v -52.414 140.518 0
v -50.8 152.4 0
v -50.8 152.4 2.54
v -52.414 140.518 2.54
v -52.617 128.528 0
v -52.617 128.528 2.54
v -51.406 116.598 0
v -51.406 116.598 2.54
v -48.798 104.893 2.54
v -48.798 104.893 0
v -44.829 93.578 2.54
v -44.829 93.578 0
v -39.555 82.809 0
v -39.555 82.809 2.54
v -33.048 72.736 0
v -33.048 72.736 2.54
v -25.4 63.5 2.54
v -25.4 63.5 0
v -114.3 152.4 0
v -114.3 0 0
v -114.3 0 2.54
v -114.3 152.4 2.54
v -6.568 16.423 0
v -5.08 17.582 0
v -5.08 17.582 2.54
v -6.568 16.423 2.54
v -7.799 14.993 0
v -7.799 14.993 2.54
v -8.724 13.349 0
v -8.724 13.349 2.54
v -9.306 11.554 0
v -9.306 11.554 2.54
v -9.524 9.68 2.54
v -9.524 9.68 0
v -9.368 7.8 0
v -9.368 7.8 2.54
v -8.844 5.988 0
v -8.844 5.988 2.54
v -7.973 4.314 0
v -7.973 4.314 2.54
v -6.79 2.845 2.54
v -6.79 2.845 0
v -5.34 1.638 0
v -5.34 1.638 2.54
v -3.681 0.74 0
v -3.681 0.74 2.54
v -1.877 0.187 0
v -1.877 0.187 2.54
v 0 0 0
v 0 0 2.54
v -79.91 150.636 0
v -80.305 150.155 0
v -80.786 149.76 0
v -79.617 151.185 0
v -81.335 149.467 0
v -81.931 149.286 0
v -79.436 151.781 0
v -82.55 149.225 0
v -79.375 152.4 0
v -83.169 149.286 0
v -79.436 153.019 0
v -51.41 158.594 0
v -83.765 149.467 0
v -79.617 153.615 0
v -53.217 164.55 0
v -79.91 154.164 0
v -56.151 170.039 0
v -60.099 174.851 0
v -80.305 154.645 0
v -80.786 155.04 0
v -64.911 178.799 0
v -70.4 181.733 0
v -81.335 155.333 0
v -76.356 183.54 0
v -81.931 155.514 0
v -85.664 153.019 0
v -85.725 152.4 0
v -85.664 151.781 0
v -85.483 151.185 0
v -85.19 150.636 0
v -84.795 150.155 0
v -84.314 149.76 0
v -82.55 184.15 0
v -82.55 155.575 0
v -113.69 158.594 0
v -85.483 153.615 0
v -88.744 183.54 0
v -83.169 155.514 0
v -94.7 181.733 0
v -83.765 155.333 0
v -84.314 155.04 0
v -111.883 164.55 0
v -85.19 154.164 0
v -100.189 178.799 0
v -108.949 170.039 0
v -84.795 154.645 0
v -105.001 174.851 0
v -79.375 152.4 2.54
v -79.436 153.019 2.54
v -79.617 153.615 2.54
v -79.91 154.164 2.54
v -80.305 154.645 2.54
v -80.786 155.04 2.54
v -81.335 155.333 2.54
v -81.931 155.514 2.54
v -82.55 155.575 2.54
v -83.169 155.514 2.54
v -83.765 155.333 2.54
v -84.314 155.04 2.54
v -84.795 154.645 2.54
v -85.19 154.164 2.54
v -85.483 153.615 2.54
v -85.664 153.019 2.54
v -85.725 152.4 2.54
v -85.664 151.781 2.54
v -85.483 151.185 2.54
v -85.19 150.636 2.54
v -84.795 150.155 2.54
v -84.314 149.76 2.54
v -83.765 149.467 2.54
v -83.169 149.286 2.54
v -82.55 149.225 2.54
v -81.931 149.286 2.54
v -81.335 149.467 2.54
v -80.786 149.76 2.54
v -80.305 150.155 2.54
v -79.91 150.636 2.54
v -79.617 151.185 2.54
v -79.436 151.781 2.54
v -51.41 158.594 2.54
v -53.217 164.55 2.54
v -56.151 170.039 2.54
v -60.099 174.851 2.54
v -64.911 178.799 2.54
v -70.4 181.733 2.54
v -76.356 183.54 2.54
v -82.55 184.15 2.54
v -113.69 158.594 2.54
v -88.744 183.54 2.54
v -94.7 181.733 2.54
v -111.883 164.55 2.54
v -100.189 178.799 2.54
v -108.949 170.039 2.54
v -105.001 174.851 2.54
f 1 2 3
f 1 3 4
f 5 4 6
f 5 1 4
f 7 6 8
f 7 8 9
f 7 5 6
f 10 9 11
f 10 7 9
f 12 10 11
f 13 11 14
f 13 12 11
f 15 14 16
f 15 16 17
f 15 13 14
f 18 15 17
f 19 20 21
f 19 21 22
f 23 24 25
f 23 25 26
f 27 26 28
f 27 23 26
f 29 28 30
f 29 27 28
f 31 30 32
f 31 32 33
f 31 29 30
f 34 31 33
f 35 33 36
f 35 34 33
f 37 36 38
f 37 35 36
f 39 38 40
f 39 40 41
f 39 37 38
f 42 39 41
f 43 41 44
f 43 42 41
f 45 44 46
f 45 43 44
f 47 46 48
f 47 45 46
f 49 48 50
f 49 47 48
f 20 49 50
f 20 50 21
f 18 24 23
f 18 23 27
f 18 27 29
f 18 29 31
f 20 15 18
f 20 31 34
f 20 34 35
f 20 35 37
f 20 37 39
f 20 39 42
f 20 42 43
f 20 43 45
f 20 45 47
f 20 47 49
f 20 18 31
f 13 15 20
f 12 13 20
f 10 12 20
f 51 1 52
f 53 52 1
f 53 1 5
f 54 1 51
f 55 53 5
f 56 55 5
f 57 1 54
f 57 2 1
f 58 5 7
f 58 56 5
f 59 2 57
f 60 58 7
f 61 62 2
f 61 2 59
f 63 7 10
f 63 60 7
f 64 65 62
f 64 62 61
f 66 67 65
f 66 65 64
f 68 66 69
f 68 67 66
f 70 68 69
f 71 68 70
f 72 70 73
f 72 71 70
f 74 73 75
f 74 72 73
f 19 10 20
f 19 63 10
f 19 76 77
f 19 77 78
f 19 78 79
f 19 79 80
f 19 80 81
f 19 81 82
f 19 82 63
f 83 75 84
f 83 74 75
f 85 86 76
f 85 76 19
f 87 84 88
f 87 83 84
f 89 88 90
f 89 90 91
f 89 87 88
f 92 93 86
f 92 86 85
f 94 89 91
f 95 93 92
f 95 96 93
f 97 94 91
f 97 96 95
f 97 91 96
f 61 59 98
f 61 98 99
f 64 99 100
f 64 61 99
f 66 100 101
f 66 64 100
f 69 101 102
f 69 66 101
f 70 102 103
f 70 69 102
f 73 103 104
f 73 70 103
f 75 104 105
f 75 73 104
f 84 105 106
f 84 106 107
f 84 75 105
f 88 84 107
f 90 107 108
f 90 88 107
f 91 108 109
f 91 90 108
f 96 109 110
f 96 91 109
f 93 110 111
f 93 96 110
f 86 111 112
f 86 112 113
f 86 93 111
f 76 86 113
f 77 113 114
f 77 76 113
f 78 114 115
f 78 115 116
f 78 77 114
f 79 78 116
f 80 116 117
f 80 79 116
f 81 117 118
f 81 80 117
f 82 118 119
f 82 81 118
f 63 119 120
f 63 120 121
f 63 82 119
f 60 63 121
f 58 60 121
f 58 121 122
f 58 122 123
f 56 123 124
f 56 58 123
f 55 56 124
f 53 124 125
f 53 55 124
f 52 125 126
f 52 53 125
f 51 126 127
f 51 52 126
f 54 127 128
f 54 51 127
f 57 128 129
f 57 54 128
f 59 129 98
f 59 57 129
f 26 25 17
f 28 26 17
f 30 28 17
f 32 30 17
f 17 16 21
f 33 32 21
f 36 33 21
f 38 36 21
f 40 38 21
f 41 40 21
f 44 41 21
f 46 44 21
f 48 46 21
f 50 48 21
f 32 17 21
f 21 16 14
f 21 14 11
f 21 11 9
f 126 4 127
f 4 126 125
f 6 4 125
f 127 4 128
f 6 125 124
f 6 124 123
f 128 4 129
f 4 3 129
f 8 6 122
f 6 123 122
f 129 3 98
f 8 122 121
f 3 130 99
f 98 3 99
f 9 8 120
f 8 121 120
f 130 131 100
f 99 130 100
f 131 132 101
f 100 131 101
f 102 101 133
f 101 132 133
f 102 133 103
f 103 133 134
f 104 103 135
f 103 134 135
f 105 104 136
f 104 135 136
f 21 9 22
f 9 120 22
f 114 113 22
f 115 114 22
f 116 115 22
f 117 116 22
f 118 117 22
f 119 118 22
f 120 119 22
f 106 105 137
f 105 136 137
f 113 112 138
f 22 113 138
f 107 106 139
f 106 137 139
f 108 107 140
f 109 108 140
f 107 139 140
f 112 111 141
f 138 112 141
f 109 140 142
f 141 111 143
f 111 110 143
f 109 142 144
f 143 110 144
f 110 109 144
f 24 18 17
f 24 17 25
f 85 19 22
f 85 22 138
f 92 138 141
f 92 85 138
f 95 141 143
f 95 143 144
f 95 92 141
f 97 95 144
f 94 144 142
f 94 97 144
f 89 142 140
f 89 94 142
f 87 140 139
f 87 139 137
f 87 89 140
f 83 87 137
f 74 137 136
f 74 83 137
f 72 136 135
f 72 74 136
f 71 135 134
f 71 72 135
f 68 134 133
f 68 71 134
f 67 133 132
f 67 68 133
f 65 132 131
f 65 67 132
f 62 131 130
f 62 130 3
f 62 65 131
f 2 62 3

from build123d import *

# Parameters (mm, degrees)
SKETCH1_R           = 3.175
BOSS_EXTRUDE1_DEPTH = 2.54


with BuildPart() as part:
    # Sketch1 → Boss-Extrude1 (new body)
    with BuildSketch(Plane.XY):
        with BuildLine():
            Line((0, 0), (-114.3, 0))
            Line((-114.3, 0), (-114.3, 152.4))
            ThreePointArc((-114.3, 152.4), (-82.55, 184.15), (-50.8, 152.4))
            ThreePointArc((-50.8, 152.4), (-48.798325541, 104.89333556), (-25.4, 63.5))
            Line((-25.4, 63.5), (-5.08, 17.582246738))
            ThreePointArc((-5.08, 17.582246738), (-9.150707628, 6.881106109), (0, 0))
        make_face()
        with Locations((-82.55, 152.4)):
            Circle(SKETCH1_R, mode=Mode.SUBTRACT)
    extrude(amount=BOSS_EXTRUDE1_DEPTH)


solid = part.part
